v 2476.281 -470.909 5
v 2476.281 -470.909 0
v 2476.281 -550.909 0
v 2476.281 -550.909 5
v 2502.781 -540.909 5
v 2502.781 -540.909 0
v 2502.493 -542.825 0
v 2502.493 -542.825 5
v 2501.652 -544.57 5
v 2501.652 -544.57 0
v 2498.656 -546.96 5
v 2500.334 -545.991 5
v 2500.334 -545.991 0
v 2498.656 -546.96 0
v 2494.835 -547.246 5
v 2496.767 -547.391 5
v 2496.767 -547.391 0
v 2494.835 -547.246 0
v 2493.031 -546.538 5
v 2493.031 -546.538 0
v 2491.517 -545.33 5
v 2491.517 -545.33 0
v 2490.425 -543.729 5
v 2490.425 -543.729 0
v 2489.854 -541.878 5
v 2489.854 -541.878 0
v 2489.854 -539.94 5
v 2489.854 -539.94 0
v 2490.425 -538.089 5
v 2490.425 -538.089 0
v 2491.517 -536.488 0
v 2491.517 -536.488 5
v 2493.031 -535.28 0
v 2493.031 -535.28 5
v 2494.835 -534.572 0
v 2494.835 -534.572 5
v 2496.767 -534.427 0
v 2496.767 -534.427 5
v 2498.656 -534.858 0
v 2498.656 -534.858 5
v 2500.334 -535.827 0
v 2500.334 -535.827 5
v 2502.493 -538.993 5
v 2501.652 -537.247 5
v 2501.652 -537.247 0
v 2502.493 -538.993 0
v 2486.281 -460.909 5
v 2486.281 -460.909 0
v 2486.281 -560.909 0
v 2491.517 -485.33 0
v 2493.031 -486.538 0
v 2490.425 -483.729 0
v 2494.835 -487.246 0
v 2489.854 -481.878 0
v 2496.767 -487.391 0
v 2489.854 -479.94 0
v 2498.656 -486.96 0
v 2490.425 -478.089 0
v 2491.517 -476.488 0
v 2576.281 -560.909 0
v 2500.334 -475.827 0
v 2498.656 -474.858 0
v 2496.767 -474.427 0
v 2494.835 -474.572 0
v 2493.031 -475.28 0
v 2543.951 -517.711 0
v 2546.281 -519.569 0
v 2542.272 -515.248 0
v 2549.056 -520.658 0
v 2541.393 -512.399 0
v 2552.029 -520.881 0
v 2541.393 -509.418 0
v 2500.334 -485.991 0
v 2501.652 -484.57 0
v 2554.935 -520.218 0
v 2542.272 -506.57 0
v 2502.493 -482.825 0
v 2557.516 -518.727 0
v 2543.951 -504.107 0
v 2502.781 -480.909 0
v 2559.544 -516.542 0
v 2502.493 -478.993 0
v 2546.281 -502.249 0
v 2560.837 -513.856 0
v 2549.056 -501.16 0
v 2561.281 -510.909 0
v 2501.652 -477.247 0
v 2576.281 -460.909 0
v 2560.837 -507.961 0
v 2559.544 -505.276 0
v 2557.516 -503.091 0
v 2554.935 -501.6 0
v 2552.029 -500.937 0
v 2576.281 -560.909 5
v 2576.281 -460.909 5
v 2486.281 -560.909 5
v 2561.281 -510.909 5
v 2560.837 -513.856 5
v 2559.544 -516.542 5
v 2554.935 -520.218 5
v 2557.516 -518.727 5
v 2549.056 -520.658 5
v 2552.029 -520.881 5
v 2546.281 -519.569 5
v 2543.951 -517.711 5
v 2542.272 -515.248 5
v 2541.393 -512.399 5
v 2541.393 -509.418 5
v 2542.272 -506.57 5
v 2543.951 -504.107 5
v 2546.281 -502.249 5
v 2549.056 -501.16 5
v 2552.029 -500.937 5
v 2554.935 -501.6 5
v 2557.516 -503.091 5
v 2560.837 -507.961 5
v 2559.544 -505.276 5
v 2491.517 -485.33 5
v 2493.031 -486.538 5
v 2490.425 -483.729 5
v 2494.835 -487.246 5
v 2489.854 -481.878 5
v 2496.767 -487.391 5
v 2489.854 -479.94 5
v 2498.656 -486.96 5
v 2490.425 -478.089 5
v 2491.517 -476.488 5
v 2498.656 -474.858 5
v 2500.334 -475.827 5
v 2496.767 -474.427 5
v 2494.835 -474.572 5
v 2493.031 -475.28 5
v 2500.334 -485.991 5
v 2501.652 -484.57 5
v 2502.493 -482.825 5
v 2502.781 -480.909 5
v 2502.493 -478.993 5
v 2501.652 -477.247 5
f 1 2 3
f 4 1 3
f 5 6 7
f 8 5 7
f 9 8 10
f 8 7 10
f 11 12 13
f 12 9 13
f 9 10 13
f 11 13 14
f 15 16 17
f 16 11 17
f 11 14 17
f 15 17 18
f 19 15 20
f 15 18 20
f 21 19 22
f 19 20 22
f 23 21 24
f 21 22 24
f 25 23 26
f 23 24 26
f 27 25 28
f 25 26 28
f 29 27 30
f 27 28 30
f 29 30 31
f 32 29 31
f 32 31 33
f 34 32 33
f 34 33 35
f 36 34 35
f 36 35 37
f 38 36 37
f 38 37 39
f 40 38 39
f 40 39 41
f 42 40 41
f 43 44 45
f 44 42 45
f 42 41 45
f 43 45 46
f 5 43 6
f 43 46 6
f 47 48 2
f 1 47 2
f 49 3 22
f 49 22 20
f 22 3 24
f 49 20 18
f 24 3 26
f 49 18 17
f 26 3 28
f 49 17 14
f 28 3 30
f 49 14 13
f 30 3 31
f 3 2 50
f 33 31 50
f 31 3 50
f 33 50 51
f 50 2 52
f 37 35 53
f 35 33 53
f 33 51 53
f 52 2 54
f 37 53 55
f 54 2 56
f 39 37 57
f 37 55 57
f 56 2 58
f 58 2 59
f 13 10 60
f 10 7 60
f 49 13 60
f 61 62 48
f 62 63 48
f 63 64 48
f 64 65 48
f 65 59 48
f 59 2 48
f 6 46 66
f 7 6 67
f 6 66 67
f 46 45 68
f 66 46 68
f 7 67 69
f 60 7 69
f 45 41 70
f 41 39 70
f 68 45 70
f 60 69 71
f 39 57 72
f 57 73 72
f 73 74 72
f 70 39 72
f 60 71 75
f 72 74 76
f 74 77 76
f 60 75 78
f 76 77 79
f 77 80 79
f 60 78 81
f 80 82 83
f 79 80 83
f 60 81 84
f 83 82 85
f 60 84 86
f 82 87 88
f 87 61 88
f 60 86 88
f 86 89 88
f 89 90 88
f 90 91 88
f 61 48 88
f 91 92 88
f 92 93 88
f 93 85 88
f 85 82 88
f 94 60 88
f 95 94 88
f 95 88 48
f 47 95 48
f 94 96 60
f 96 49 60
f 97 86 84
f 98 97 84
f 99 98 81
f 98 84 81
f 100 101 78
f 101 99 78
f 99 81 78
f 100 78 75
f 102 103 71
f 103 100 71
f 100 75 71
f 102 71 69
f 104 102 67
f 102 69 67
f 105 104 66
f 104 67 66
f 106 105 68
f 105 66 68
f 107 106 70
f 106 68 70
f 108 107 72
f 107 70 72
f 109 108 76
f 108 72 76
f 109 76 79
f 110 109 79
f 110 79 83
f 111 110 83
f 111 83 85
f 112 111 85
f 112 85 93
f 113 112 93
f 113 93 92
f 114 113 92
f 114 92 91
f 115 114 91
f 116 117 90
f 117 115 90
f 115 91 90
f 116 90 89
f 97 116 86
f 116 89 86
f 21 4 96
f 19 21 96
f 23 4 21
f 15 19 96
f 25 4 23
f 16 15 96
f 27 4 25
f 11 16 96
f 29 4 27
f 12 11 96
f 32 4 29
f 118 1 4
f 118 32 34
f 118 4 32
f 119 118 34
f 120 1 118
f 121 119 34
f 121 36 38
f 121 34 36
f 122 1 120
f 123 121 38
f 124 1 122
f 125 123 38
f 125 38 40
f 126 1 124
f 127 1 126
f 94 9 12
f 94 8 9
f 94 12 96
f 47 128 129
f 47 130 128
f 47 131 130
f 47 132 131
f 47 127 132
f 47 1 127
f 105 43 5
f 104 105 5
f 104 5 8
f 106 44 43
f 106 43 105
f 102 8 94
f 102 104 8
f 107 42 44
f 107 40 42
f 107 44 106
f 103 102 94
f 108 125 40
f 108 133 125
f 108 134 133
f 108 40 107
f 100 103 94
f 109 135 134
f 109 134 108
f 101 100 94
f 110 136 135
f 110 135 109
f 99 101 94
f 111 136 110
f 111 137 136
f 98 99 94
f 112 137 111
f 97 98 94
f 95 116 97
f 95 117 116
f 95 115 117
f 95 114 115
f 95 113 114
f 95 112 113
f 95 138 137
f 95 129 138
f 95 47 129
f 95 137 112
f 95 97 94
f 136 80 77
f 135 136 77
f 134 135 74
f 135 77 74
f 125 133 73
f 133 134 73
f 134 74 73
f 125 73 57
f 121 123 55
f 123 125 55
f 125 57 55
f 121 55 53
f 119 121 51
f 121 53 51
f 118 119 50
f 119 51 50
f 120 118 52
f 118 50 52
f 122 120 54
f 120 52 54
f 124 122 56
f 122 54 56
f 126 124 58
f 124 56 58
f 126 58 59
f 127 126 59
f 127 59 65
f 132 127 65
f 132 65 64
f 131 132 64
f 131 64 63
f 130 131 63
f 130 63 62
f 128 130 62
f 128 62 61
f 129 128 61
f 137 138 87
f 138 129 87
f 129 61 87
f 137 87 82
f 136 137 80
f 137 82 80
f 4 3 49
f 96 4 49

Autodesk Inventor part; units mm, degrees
ref_plane "YZ Plane" through (0, 0, 0) normal (1, 0, 0) x (0, 1, 0)
ref_plane "XZ Plane" through (0, 0, 0) normal (0, 1, 0) x (-1, 0, 0)
ref_plane "XY Plane" through (0, 0, 0) normal (0, 0, 1) x (1, 0, 0)
sketch "Sketch1" plane through (0, 0, 0) normal (0, 0, 1) x (1, 0, 0)
  line L0 (2537.2814, -518.9919) -> (2551.2814, -527.0748)
  line L1 (2551.2814, -527.0748) -> (2565.2814, -518.9919)
  line L2 (2565.2814, -518.9919) -> (2565.2814, -502.826)
  line L3 (2565.2814, -502.826) -> (2551.2814, -494.7431)
  line L4 (2551.2814, -494.7431) -> (2537.2814, -502.826)
  line L5 (2537.2814, -502.826) -> (2537.2814, -518.9919)
  line L6 (2476.2814, -470.9089) -> (2476.2814, -550.9089)
  line L7 (2476.2814, -550.9089) -> (2486.2814, -560.9089)
  line L8 (2486.2814, -560.9089) -> (2576.2814, -560.9089)
  line L9 (2576.2814, -560.9089) -> (2576.2814, -460.9089)
  line L10 (2576.2814, -460.9089) -> (2486.2814, -460.9089)
  line L11 (2486.2814, -460.9089) -> (2476.2814, -470.9089)
  circle A0 centre (2496.2814, -540.9089) radius 6.5
  circle A1 centre (2496.2814, -480.9089) radius 6.5
  circle A2 centre (2551.2814, -510.9089) radius 10
  point P0 (0, 0)
  dimension "d1" = 80
  dimension "d3" = 25
  dimension "d5" = 100
  dimension "d7" = 13
  dimension "d9" = 100
  dimension "d11" = 50
  dimension "d13" = 20
  dimension "d15" = 20
extrude "Extrusion1" add sketch "Sketch1" along normal blind 5 contours L5 L4 L3 L2 L1 L0 | L11 L10 L9 L8 L7 L6
properties part number "ADSK-MH-10042" material "Steel, Mild"
